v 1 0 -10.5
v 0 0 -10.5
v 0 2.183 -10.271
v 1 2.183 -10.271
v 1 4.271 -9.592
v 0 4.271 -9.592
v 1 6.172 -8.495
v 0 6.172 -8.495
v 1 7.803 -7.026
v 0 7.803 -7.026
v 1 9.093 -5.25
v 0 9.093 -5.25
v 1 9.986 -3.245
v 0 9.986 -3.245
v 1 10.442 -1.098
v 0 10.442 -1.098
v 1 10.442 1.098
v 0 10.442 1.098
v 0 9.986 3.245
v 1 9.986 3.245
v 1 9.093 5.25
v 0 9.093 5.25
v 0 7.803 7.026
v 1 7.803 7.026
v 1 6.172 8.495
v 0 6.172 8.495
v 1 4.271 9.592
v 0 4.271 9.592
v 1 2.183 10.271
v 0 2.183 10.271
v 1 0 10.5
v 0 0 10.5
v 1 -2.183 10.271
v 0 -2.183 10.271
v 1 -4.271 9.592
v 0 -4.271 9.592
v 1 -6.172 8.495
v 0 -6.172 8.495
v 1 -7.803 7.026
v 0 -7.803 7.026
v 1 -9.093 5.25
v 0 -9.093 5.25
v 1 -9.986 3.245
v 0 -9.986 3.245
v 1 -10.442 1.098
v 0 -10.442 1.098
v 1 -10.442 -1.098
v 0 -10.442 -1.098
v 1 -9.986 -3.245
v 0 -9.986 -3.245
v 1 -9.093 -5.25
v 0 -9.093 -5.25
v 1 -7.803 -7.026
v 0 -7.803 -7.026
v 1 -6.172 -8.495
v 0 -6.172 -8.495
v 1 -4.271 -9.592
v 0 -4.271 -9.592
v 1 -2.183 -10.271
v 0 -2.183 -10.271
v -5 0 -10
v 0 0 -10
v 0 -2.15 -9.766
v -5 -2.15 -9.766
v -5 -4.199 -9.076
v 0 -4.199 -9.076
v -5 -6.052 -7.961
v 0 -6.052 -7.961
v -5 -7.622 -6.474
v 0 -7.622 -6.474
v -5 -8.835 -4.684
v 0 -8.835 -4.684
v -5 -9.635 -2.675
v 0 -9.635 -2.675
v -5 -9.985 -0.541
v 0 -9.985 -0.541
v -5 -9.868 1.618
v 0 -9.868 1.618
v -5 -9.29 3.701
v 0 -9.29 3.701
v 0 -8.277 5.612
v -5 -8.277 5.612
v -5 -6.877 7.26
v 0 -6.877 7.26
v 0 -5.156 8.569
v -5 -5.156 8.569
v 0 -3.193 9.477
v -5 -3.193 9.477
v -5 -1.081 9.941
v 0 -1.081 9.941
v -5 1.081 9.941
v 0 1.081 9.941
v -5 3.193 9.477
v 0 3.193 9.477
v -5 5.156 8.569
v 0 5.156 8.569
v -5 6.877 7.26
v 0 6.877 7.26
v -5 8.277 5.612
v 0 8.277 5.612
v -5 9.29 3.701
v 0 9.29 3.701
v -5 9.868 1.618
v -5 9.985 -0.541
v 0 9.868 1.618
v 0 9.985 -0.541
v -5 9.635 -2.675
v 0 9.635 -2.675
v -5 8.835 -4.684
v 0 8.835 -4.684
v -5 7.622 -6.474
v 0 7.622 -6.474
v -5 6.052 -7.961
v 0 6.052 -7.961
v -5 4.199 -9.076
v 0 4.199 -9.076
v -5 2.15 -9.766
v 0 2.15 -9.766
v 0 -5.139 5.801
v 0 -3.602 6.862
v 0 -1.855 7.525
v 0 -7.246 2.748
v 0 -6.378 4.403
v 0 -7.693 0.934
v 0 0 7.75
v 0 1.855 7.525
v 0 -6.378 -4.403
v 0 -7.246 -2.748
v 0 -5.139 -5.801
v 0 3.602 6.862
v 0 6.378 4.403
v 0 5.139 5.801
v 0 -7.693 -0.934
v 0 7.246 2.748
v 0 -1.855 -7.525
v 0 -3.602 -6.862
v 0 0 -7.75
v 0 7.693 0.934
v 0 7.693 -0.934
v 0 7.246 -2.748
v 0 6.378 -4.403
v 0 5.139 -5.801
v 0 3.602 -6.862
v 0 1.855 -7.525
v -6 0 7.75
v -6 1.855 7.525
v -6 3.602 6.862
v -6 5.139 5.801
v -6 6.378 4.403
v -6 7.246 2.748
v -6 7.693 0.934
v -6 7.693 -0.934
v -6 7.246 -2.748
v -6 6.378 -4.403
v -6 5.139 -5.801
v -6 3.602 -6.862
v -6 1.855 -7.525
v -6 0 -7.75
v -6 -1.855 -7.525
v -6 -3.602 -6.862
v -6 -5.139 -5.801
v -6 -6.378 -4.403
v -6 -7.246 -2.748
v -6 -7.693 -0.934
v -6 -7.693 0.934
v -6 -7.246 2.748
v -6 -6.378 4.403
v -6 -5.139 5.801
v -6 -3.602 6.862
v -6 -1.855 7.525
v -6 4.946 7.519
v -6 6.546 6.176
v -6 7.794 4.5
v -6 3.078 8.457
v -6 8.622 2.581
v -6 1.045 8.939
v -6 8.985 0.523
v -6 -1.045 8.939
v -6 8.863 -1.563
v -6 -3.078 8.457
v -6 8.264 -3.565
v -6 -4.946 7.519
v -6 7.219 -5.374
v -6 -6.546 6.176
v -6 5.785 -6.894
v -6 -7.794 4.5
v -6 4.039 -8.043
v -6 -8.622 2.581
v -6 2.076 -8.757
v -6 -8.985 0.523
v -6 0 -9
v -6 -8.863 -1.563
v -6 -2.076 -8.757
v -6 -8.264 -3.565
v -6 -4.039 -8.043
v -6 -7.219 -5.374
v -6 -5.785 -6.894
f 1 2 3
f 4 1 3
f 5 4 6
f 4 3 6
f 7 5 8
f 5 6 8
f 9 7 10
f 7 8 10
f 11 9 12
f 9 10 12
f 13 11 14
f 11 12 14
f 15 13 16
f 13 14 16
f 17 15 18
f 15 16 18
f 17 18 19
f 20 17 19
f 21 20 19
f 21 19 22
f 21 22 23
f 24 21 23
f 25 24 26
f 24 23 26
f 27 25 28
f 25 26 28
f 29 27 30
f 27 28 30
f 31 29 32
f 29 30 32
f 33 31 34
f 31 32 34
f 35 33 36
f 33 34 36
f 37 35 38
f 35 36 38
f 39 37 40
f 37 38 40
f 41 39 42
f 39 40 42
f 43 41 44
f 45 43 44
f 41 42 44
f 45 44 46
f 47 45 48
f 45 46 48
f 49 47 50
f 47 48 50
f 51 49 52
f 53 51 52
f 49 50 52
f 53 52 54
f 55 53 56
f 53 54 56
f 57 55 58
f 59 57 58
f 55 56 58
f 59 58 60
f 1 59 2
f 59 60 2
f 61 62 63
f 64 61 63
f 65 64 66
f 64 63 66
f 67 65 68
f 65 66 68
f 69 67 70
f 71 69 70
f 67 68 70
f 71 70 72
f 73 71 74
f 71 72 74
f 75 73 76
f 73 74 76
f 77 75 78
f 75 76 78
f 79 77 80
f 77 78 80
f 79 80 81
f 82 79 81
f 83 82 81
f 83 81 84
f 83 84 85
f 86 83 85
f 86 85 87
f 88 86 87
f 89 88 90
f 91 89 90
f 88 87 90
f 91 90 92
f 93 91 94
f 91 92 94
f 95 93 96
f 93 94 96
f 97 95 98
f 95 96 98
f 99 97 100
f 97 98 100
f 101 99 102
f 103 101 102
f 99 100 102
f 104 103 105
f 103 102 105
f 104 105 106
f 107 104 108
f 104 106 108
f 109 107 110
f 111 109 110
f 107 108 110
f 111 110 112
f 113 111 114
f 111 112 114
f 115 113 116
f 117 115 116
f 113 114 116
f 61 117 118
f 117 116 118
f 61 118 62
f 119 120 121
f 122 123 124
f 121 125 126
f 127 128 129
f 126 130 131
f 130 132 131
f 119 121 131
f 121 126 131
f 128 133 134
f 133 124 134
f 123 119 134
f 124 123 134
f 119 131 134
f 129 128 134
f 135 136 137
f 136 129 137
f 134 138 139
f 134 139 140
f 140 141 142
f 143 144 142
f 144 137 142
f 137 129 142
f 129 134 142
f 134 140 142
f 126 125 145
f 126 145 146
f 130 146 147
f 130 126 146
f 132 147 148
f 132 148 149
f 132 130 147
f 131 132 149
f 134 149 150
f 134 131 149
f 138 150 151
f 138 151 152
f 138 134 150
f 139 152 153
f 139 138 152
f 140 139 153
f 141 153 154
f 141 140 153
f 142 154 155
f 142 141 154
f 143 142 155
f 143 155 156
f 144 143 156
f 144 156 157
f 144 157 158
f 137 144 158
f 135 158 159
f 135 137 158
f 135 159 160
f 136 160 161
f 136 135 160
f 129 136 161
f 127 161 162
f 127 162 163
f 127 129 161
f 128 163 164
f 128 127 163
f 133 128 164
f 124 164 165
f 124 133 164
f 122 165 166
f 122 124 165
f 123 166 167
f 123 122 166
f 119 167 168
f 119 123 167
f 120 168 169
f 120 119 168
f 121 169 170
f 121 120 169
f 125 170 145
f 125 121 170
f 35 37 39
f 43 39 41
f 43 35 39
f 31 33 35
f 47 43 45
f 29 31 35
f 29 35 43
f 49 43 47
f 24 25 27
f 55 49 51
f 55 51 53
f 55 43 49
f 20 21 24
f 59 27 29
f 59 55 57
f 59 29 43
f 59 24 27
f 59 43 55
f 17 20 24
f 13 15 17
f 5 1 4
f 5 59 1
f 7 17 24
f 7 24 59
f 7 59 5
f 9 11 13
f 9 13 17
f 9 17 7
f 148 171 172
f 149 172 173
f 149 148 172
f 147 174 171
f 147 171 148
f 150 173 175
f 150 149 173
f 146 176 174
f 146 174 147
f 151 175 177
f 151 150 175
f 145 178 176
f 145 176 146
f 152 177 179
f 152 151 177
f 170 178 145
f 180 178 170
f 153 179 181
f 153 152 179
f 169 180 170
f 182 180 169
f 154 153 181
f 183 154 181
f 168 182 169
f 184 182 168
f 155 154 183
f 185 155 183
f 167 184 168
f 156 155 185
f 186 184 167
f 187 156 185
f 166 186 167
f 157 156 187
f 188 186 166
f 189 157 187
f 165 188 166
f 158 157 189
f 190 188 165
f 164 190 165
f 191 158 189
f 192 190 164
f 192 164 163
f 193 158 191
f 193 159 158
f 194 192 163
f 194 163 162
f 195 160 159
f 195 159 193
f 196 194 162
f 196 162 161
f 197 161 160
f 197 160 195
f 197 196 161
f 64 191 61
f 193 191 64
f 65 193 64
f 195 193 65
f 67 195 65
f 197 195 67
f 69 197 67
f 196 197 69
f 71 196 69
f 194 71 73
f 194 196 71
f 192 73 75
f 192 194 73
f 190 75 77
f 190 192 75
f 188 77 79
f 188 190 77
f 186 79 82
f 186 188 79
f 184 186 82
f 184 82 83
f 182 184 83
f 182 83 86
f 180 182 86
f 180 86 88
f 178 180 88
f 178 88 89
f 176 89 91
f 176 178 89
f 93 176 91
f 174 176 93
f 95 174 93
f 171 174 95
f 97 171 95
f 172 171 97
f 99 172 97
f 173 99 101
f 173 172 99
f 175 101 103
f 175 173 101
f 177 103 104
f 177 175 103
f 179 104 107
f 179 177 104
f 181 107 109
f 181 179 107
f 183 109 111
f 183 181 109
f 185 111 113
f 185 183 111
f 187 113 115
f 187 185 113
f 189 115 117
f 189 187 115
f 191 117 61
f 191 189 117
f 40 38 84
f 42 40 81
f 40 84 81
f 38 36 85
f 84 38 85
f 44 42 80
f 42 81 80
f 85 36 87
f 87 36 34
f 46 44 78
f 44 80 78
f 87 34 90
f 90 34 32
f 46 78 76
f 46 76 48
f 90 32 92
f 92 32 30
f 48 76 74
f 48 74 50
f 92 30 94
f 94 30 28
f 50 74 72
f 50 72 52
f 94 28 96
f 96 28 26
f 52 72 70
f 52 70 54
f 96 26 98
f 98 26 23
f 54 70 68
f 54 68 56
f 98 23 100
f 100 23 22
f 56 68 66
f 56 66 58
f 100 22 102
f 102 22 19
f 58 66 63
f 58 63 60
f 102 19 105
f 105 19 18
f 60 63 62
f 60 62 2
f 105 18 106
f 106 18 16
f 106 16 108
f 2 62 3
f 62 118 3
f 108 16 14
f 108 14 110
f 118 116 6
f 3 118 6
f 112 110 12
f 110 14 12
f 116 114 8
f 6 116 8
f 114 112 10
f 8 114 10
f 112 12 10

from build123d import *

# Parameters (mm, degrees)
ESQUISSE1_R      = 10.5
EXTRUSION1_DEPTH = 1
ESQUISSE2_R      = 10
ESQUISSE2_R_2    = 7.75
EXTRUSION2_DEPTH = 6
CHANFREIN1_SIZE  = 1


with BuildPart() as part:
    # Esquisse1 → Extrusion1 (new body)
    with BuildSketch(Plane(origin=(0, 0, 0), x_dir=(0, 0, -1), z_dir=(1, 0, 0))):
        Circle(ESQUISSE1_R)
    extrude(amount=EXTRUSION1_DEPTH)

    # Esquisse2 → Extrusion2 (add)
    with BuildSketch(Plane.ZY):
        with Locations(Location((0, 0, 0), (0, 0, 180))):  # turned: the seam where the file's is
            Circle(ESQUISSE2_R)
        Circle(ESQUISSE2_R_2, mode=Mode.SUBTRACT)
    extrude(amount=EXTRUSION2_DEPTH)

    # Chanfrein1
    chanfrein1_edges = [part.edges().sort_by_distance(p)[0] for p in [
        (-6, 0, 10),
    ]]
    chamfer(chanfrein1_edges, length=CHANFREIN1_SIZE)


solid = part.part
